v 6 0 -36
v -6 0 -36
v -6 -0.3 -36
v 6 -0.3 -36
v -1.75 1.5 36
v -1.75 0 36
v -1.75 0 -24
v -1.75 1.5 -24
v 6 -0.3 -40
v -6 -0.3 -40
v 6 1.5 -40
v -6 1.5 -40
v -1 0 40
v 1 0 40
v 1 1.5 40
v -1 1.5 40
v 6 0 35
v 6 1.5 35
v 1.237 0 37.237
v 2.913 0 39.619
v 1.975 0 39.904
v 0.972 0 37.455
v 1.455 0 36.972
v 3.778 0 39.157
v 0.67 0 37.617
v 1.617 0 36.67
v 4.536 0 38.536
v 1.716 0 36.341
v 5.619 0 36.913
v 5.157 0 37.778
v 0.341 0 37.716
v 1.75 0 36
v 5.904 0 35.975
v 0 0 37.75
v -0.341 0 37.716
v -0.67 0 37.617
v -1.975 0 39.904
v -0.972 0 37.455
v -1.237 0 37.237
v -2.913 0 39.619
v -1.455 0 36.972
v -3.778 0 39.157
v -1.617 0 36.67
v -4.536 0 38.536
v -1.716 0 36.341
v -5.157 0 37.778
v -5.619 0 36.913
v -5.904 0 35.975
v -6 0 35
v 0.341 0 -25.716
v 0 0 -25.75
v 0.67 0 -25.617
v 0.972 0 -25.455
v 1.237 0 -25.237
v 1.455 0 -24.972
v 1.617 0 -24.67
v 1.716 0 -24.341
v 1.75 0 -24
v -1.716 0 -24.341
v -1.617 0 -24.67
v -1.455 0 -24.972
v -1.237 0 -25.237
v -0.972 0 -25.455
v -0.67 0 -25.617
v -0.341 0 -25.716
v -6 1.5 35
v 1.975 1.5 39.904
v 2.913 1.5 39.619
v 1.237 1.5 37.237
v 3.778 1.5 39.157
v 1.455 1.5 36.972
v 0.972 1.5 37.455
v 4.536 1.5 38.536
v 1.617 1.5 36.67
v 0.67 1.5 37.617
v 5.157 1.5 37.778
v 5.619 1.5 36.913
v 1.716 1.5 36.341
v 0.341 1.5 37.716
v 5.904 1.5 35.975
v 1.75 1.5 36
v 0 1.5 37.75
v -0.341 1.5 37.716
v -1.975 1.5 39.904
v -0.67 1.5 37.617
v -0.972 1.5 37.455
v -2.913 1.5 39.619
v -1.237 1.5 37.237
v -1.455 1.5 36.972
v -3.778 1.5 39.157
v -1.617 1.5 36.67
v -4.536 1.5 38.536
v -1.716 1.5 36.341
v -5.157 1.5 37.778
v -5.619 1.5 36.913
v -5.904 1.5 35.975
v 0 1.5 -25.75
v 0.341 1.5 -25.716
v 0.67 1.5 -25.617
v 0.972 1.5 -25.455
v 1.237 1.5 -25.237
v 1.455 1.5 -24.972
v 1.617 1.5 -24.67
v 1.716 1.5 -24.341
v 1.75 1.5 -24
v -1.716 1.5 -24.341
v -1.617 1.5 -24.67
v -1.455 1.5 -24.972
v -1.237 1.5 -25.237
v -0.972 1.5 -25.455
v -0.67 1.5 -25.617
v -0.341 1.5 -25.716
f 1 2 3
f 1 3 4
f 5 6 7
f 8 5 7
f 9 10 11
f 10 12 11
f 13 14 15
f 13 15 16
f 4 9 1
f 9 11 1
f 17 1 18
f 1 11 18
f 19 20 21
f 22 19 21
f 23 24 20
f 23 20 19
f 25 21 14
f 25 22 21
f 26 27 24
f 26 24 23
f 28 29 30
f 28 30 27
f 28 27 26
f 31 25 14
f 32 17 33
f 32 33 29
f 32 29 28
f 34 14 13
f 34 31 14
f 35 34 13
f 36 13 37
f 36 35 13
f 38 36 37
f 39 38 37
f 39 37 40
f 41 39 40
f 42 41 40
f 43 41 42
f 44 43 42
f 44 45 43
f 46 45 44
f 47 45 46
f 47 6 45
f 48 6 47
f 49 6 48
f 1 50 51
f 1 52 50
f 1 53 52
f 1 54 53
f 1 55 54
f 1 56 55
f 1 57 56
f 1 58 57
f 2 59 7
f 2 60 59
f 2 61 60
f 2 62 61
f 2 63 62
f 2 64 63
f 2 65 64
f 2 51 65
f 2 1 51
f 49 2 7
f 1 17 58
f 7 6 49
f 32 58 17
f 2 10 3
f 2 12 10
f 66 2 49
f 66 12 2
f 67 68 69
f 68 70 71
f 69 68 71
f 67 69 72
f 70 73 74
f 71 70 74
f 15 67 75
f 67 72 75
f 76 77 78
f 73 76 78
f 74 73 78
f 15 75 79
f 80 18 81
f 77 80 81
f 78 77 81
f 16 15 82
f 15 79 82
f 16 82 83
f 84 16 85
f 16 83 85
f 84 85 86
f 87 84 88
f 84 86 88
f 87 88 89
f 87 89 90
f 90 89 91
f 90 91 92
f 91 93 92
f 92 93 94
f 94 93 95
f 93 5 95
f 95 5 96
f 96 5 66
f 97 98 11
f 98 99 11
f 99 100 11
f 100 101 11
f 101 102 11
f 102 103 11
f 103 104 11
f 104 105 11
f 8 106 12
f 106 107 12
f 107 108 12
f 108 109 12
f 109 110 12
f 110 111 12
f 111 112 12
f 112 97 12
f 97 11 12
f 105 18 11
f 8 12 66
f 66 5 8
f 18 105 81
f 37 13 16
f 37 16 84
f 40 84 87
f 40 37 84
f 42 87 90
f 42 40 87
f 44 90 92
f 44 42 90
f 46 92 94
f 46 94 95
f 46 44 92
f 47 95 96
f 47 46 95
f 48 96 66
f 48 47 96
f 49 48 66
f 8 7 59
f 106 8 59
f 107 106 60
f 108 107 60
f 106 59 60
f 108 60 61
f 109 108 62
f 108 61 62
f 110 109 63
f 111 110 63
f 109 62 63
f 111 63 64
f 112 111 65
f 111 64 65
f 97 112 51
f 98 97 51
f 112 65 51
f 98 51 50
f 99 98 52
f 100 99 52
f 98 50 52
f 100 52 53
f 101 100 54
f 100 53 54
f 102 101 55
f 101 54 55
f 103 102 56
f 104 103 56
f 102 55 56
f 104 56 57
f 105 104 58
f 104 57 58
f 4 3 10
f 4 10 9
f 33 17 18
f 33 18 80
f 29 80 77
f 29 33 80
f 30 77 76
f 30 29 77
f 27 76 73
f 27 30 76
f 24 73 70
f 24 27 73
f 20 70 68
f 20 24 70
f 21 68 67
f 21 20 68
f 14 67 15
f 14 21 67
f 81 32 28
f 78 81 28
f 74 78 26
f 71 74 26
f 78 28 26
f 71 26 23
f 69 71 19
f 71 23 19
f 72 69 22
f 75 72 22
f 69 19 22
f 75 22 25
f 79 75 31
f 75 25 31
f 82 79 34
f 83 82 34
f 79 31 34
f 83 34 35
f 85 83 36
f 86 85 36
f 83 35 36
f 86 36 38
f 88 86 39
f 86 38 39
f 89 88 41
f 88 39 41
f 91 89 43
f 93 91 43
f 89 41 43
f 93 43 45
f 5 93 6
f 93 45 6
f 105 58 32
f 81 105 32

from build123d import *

# Parameters (mm, degrees)
EXTRUDE_1_DEPTH = 1.5
SKETCH_2_W      = 12
SKETCH_2_H      = 4
EXTRUDE_2_DEPTH = 0.3


with BuildPart() as part:
    # 草图1 → 凸台-拉伸1 (new body)
    with BuildSketch(Plane(origin=(0, 0, 0), x_dir=(1, 0, 0), z_dir=(0, 1, 0))):
        with BuildLine():
            Line((-6, 40), (6, 40))
            Line((6, 40), (6, -35))
            ThreePointArc((6, -35), (4.535533906, -38.535533906), (1, -40))
            Line((1, -40), (-1, -40))
            ThreePointArc((-1, -40), (-4.535533906, -38.535533906), (-6, -35))
            Line((-6, -35), (-6, 40))
        make_face()
        with BuildLine():
            Line((-1.75, -36), (-1.75, 24))
            ThreePointArc((-1.75, 24), (0, 25.75), (1.75, 24))
            Line((1.75, 24), (1.75, -36))
            ThreePointArc((1.75, -36), (0, -37.75), (-1.75, -36))
        make_face(mode=Mode.SUBTRACT)
    extrude(amount=EXTRUDE_1_DEPTH)

    # 草图2 → 凸台-拉伸2 (add)
    with BuildSketch(Plane.XZ):
        with Locations((0, -38)):
            Rectangle(SKETCH_2_W, SKETCH_2_H)
    extrude(amount=EXTRUDE_2_DEPTH)


solid = part.part
